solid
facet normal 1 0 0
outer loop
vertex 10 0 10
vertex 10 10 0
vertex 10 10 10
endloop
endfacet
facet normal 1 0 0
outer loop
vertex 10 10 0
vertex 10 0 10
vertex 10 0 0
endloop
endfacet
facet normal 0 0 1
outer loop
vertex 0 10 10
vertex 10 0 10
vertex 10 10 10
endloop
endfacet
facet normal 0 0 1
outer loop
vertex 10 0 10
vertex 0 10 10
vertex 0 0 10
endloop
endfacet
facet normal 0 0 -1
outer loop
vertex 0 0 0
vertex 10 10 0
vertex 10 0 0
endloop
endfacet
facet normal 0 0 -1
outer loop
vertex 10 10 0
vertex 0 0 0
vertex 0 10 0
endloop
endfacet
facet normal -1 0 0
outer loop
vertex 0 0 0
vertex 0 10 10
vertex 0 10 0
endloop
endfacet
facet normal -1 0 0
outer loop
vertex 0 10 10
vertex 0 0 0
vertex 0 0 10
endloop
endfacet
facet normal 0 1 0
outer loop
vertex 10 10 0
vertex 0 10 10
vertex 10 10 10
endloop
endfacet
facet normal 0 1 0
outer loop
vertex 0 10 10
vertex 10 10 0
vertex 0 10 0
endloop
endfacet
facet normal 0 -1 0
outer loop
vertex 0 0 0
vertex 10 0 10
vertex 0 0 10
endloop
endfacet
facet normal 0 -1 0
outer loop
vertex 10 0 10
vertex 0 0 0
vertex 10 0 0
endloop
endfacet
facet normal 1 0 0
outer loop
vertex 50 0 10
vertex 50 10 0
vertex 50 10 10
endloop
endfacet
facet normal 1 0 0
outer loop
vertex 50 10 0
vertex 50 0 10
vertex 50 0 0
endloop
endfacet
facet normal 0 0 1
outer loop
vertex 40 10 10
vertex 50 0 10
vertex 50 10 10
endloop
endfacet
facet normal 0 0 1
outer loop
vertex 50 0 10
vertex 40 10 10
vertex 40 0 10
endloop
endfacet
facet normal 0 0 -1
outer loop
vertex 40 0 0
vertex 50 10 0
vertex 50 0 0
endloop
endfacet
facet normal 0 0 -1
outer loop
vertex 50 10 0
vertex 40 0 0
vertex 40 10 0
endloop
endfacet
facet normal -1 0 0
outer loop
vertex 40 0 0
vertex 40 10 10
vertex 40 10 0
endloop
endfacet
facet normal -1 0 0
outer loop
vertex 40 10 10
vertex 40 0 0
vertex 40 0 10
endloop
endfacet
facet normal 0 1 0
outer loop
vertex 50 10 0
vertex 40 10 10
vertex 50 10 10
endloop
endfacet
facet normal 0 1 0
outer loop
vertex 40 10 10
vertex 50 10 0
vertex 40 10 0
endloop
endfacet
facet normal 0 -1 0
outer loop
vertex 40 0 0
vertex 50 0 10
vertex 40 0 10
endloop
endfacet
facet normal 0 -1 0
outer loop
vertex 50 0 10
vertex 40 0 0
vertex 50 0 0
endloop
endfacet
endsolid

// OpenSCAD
// Original CanvasNet test fixture: the four statement modifiers on four cubes along X.
// Only the first and the third cube are drawn; the second is disabled and the fourth is a background object.
cube(10);
*translate([20, 0, 0]) cube(10);
#translate([40, 0, 0]) cube(10);
%translate([60, 0, 0]) cube(10);
